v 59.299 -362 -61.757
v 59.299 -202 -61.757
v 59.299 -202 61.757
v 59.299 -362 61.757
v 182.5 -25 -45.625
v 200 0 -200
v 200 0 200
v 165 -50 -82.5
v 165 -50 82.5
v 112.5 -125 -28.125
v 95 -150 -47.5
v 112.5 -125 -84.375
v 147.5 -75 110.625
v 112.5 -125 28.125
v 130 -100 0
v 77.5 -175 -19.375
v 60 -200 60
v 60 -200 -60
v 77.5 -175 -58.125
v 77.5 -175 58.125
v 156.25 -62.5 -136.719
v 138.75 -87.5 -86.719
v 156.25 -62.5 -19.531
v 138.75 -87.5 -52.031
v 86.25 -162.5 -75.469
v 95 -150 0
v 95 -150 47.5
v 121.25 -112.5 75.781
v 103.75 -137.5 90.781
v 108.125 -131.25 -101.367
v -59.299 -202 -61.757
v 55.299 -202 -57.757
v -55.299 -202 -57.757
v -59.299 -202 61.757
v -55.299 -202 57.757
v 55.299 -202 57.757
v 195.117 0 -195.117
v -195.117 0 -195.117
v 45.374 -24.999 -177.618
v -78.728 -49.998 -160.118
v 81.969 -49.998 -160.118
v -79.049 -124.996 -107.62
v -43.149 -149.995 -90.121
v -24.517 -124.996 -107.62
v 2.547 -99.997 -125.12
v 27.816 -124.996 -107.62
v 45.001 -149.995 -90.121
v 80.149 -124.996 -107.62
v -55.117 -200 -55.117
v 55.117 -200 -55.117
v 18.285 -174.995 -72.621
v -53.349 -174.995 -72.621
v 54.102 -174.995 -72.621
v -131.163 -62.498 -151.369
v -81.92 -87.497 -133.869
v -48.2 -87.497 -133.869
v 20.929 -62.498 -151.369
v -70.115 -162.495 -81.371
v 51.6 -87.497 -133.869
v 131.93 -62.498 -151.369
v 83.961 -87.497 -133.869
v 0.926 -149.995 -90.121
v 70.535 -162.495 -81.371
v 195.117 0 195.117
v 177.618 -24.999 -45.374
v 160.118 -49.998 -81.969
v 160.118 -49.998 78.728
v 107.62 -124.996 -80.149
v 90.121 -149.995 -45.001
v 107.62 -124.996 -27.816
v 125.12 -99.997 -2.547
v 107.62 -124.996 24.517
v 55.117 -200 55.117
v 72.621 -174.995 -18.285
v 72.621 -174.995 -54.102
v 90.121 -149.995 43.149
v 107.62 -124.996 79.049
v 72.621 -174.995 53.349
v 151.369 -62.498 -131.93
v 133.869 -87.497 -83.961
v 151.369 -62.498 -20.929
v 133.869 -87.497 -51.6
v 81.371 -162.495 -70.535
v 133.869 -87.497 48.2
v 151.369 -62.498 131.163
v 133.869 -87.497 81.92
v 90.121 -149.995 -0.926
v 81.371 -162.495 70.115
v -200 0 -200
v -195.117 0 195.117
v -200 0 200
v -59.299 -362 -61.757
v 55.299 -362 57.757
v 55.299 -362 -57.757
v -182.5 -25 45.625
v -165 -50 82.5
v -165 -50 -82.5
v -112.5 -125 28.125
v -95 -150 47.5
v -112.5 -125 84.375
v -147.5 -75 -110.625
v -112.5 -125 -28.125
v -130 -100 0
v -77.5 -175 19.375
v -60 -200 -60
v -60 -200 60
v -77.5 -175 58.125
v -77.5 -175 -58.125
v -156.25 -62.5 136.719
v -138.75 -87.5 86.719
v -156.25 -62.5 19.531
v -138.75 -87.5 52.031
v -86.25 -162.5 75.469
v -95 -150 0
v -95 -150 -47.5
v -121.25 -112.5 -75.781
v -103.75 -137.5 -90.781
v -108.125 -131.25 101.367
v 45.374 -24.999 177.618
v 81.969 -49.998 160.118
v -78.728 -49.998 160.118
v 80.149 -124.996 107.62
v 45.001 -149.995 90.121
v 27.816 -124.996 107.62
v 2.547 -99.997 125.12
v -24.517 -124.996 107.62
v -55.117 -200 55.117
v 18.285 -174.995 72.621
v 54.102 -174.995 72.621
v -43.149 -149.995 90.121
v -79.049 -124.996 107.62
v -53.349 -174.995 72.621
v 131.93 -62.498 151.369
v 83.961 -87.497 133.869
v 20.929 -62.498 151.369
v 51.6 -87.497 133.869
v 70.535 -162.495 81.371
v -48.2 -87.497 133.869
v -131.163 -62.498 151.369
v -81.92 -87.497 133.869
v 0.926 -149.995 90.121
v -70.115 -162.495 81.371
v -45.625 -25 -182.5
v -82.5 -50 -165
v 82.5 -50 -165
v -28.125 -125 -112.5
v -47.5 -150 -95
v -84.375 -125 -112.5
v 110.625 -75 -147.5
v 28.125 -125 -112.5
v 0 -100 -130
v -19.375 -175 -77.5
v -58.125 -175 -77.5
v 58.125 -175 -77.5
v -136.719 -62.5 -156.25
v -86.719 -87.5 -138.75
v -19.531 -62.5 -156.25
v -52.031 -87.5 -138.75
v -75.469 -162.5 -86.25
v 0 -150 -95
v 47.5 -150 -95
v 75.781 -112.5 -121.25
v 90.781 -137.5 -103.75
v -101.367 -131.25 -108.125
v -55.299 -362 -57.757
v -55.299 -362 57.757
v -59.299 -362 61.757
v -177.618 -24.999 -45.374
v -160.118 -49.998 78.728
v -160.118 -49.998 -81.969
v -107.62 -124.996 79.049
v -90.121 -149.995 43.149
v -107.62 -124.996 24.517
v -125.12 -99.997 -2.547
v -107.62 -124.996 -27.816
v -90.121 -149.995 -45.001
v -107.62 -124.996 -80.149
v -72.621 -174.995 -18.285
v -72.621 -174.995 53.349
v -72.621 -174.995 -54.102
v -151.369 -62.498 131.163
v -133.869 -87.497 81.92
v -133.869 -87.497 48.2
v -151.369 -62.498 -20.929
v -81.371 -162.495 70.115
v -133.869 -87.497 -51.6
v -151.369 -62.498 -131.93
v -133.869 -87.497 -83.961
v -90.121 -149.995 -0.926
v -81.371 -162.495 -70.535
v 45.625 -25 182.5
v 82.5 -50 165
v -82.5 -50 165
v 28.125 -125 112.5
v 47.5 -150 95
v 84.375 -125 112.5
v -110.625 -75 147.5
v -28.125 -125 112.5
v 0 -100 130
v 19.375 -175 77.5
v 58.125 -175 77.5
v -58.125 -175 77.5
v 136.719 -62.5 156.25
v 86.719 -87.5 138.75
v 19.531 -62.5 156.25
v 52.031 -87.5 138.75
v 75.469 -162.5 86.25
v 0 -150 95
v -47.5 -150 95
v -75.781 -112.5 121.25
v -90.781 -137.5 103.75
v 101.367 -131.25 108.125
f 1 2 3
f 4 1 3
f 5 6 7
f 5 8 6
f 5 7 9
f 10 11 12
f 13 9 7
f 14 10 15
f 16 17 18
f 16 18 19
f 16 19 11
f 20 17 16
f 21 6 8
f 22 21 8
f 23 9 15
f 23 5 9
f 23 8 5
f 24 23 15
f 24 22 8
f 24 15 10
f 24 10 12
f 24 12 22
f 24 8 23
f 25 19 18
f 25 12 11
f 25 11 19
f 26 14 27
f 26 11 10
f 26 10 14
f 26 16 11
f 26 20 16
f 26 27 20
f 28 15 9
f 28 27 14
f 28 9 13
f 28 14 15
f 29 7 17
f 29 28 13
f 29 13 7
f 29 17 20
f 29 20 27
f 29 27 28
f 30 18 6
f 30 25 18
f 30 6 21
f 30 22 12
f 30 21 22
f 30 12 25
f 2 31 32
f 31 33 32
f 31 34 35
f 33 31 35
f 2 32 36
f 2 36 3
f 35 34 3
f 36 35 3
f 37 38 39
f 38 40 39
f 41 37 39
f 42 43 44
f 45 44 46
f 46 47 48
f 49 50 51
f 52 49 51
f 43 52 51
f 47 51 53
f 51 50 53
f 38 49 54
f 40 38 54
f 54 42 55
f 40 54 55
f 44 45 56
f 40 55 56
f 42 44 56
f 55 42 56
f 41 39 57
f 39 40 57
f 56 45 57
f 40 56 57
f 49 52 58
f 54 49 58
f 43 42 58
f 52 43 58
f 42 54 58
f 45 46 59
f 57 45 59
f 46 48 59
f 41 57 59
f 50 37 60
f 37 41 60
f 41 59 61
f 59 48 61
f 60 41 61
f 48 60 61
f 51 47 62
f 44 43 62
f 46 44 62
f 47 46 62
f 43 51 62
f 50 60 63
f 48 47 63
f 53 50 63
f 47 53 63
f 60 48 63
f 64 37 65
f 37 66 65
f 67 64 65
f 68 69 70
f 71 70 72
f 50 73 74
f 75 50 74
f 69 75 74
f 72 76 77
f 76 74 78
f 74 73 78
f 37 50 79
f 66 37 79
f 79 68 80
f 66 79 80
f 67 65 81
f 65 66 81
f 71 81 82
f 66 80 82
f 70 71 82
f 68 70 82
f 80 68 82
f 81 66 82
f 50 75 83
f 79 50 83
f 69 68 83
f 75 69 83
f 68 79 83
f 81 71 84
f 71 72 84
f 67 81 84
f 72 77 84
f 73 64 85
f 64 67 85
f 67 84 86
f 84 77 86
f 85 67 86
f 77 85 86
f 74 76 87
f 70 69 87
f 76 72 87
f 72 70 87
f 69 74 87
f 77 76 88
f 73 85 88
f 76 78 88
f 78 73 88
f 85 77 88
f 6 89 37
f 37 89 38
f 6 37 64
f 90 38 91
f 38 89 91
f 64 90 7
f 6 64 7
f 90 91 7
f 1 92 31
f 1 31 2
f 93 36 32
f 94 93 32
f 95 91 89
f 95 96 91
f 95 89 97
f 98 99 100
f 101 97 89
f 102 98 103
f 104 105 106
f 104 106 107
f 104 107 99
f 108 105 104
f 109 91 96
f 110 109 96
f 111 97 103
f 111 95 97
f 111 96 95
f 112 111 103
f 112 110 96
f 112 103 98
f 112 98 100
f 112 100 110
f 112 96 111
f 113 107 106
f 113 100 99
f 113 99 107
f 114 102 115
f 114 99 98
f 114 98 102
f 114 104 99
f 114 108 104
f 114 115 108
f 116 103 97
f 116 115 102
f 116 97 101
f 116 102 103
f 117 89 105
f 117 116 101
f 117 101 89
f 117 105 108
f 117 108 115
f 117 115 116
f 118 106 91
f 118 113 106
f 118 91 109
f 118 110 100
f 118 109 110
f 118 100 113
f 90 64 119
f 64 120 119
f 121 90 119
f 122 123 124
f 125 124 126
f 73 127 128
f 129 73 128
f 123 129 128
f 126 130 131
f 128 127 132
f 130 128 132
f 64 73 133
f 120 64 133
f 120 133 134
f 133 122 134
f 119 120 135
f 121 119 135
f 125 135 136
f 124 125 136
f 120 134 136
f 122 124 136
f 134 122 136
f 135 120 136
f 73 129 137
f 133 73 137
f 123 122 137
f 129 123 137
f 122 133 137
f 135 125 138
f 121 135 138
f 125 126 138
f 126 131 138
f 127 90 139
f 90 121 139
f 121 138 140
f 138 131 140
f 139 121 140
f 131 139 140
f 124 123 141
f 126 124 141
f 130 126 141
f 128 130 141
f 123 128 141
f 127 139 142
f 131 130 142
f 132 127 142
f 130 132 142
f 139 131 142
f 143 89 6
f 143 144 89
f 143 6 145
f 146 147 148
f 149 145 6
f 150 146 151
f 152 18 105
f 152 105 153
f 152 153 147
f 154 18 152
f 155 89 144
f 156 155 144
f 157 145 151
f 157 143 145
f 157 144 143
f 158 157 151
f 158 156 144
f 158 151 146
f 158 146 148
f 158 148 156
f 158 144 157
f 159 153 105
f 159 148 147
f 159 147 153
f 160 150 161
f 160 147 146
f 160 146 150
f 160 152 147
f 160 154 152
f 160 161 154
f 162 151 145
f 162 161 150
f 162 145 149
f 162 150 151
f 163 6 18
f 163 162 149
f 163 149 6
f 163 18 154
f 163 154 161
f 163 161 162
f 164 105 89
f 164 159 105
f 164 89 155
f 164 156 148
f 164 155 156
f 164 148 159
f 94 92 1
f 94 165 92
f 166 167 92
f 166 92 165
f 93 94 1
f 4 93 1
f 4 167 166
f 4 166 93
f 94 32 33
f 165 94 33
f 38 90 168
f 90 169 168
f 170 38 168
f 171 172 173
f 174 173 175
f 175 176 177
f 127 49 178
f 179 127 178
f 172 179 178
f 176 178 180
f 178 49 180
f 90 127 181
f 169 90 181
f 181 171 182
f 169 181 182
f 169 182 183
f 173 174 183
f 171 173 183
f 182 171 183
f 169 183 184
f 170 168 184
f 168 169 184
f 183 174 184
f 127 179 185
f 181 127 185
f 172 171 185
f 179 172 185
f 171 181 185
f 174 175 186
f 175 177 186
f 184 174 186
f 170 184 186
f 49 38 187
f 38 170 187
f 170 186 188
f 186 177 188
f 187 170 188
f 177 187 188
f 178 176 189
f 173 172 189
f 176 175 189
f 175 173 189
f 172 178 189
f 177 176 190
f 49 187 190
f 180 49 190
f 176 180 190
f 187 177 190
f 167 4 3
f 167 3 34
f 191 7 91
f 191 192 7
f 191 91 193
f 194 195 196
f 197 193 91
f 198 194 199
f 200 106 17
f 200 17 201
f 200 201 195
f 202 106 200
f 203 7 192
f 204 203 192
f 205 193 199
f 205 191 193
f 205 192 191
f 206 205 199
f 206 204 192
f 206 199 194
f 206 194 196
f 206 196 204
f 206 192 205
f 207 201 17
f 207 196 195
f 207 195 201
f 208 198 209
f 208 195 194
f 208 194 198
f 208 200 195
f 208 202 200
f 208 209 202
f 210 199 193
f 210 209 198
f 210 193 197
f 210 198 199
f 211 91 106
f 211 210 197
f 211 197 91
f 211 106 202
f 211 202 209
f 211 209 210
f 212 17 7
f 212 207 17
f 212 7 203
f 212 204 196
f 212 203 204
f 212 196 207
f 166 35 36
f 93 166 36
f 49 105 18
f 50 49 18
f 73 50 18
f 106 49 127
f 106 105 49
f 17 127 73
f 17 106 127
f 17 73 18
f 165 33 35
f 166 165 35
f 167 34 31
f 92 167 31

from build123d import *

# Parameters (mm, degrees)
F0_W     = 400
F0_H     = 400
F2_W     = 120
F2_H     = 120
F4_T     = -4
F7_DEPTH = 160


with BuildPart() as f3:
    # F0 (on Front) → F3 section 0
    with BuildSketch(Plane.XZ):
        Rectangle(F0_W, F0_H)
    # F2 (on offset) → F3 section 1
    with BuildSketch(Plane.XZ.offset(200)):
        Rectangle(F2_W, F2_H)
    loft()

    # F4
    f4_openings = [f3.faces().sort_by_distance(p)[0] for p in [
        (0, 0, 0),
        (0, -200, 0),
    ]]
    offset(amount=F4_T, openings=f4_openings, kind=Kind.INTERSECTION)


with BuildPart() as f7:
    # F6 (on offset) → F7 (new body)
    with BuildSketch(Plane.XZ.offset(202)):
        Polygon((59.2993535101, 61.7569126189), (-59.2993535101, 61.7569126189), (-59.2993535101, 56.7569126189), (-55.2993535101, 56.7569126189), (-55.2993535101, 57.7569126189), (55.2993535101, 57.7569126189), (55.2993535101, 56.7569126189), (59.2993535101, 56.7569126189), align=None)
        Polygon((-55.2993535101, 56.7569126189), (-59.2993535101, 56.7569126189), (-59.2993535101, -61.7569126189), (59.2993535101, -61.7569126189), (59.2993535101, 56.7569126189), (55.2993535101, 56.7569126189), (55.2993535101, -57.7569126189), (-55.2993535101, -57.7569126189), align=None)
    extrude(amount=F7_DEPTH)


solid = Compound([f3.part, f7.part])
